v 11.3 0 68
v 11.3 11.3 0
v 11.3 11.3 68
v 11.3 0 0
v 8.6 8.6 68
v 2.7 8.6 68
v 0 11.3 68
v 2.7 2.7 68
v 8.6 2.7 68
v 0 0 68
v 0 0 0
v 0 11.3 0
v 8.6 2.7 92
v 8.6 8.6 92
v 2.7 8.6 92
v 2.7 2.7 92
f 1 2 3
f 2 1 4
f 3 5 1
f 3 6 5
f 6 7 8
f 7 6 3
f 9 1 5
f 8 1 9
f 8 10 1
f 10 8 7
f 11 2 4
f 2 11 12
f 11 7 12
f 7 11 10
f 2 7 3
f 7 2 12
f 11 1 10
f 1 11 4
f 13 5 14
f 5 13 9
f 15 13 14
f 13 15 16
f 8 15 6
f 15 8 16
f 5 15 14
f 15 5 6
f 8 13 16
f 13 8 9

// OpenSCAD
// Bloque inferior
cube([11.3,11.3,68]);

// Bloque superior
translate([(11.3-5.9)/2,(11.3-5.9)/2,68])cube([5.9,5.9,92-68]);
